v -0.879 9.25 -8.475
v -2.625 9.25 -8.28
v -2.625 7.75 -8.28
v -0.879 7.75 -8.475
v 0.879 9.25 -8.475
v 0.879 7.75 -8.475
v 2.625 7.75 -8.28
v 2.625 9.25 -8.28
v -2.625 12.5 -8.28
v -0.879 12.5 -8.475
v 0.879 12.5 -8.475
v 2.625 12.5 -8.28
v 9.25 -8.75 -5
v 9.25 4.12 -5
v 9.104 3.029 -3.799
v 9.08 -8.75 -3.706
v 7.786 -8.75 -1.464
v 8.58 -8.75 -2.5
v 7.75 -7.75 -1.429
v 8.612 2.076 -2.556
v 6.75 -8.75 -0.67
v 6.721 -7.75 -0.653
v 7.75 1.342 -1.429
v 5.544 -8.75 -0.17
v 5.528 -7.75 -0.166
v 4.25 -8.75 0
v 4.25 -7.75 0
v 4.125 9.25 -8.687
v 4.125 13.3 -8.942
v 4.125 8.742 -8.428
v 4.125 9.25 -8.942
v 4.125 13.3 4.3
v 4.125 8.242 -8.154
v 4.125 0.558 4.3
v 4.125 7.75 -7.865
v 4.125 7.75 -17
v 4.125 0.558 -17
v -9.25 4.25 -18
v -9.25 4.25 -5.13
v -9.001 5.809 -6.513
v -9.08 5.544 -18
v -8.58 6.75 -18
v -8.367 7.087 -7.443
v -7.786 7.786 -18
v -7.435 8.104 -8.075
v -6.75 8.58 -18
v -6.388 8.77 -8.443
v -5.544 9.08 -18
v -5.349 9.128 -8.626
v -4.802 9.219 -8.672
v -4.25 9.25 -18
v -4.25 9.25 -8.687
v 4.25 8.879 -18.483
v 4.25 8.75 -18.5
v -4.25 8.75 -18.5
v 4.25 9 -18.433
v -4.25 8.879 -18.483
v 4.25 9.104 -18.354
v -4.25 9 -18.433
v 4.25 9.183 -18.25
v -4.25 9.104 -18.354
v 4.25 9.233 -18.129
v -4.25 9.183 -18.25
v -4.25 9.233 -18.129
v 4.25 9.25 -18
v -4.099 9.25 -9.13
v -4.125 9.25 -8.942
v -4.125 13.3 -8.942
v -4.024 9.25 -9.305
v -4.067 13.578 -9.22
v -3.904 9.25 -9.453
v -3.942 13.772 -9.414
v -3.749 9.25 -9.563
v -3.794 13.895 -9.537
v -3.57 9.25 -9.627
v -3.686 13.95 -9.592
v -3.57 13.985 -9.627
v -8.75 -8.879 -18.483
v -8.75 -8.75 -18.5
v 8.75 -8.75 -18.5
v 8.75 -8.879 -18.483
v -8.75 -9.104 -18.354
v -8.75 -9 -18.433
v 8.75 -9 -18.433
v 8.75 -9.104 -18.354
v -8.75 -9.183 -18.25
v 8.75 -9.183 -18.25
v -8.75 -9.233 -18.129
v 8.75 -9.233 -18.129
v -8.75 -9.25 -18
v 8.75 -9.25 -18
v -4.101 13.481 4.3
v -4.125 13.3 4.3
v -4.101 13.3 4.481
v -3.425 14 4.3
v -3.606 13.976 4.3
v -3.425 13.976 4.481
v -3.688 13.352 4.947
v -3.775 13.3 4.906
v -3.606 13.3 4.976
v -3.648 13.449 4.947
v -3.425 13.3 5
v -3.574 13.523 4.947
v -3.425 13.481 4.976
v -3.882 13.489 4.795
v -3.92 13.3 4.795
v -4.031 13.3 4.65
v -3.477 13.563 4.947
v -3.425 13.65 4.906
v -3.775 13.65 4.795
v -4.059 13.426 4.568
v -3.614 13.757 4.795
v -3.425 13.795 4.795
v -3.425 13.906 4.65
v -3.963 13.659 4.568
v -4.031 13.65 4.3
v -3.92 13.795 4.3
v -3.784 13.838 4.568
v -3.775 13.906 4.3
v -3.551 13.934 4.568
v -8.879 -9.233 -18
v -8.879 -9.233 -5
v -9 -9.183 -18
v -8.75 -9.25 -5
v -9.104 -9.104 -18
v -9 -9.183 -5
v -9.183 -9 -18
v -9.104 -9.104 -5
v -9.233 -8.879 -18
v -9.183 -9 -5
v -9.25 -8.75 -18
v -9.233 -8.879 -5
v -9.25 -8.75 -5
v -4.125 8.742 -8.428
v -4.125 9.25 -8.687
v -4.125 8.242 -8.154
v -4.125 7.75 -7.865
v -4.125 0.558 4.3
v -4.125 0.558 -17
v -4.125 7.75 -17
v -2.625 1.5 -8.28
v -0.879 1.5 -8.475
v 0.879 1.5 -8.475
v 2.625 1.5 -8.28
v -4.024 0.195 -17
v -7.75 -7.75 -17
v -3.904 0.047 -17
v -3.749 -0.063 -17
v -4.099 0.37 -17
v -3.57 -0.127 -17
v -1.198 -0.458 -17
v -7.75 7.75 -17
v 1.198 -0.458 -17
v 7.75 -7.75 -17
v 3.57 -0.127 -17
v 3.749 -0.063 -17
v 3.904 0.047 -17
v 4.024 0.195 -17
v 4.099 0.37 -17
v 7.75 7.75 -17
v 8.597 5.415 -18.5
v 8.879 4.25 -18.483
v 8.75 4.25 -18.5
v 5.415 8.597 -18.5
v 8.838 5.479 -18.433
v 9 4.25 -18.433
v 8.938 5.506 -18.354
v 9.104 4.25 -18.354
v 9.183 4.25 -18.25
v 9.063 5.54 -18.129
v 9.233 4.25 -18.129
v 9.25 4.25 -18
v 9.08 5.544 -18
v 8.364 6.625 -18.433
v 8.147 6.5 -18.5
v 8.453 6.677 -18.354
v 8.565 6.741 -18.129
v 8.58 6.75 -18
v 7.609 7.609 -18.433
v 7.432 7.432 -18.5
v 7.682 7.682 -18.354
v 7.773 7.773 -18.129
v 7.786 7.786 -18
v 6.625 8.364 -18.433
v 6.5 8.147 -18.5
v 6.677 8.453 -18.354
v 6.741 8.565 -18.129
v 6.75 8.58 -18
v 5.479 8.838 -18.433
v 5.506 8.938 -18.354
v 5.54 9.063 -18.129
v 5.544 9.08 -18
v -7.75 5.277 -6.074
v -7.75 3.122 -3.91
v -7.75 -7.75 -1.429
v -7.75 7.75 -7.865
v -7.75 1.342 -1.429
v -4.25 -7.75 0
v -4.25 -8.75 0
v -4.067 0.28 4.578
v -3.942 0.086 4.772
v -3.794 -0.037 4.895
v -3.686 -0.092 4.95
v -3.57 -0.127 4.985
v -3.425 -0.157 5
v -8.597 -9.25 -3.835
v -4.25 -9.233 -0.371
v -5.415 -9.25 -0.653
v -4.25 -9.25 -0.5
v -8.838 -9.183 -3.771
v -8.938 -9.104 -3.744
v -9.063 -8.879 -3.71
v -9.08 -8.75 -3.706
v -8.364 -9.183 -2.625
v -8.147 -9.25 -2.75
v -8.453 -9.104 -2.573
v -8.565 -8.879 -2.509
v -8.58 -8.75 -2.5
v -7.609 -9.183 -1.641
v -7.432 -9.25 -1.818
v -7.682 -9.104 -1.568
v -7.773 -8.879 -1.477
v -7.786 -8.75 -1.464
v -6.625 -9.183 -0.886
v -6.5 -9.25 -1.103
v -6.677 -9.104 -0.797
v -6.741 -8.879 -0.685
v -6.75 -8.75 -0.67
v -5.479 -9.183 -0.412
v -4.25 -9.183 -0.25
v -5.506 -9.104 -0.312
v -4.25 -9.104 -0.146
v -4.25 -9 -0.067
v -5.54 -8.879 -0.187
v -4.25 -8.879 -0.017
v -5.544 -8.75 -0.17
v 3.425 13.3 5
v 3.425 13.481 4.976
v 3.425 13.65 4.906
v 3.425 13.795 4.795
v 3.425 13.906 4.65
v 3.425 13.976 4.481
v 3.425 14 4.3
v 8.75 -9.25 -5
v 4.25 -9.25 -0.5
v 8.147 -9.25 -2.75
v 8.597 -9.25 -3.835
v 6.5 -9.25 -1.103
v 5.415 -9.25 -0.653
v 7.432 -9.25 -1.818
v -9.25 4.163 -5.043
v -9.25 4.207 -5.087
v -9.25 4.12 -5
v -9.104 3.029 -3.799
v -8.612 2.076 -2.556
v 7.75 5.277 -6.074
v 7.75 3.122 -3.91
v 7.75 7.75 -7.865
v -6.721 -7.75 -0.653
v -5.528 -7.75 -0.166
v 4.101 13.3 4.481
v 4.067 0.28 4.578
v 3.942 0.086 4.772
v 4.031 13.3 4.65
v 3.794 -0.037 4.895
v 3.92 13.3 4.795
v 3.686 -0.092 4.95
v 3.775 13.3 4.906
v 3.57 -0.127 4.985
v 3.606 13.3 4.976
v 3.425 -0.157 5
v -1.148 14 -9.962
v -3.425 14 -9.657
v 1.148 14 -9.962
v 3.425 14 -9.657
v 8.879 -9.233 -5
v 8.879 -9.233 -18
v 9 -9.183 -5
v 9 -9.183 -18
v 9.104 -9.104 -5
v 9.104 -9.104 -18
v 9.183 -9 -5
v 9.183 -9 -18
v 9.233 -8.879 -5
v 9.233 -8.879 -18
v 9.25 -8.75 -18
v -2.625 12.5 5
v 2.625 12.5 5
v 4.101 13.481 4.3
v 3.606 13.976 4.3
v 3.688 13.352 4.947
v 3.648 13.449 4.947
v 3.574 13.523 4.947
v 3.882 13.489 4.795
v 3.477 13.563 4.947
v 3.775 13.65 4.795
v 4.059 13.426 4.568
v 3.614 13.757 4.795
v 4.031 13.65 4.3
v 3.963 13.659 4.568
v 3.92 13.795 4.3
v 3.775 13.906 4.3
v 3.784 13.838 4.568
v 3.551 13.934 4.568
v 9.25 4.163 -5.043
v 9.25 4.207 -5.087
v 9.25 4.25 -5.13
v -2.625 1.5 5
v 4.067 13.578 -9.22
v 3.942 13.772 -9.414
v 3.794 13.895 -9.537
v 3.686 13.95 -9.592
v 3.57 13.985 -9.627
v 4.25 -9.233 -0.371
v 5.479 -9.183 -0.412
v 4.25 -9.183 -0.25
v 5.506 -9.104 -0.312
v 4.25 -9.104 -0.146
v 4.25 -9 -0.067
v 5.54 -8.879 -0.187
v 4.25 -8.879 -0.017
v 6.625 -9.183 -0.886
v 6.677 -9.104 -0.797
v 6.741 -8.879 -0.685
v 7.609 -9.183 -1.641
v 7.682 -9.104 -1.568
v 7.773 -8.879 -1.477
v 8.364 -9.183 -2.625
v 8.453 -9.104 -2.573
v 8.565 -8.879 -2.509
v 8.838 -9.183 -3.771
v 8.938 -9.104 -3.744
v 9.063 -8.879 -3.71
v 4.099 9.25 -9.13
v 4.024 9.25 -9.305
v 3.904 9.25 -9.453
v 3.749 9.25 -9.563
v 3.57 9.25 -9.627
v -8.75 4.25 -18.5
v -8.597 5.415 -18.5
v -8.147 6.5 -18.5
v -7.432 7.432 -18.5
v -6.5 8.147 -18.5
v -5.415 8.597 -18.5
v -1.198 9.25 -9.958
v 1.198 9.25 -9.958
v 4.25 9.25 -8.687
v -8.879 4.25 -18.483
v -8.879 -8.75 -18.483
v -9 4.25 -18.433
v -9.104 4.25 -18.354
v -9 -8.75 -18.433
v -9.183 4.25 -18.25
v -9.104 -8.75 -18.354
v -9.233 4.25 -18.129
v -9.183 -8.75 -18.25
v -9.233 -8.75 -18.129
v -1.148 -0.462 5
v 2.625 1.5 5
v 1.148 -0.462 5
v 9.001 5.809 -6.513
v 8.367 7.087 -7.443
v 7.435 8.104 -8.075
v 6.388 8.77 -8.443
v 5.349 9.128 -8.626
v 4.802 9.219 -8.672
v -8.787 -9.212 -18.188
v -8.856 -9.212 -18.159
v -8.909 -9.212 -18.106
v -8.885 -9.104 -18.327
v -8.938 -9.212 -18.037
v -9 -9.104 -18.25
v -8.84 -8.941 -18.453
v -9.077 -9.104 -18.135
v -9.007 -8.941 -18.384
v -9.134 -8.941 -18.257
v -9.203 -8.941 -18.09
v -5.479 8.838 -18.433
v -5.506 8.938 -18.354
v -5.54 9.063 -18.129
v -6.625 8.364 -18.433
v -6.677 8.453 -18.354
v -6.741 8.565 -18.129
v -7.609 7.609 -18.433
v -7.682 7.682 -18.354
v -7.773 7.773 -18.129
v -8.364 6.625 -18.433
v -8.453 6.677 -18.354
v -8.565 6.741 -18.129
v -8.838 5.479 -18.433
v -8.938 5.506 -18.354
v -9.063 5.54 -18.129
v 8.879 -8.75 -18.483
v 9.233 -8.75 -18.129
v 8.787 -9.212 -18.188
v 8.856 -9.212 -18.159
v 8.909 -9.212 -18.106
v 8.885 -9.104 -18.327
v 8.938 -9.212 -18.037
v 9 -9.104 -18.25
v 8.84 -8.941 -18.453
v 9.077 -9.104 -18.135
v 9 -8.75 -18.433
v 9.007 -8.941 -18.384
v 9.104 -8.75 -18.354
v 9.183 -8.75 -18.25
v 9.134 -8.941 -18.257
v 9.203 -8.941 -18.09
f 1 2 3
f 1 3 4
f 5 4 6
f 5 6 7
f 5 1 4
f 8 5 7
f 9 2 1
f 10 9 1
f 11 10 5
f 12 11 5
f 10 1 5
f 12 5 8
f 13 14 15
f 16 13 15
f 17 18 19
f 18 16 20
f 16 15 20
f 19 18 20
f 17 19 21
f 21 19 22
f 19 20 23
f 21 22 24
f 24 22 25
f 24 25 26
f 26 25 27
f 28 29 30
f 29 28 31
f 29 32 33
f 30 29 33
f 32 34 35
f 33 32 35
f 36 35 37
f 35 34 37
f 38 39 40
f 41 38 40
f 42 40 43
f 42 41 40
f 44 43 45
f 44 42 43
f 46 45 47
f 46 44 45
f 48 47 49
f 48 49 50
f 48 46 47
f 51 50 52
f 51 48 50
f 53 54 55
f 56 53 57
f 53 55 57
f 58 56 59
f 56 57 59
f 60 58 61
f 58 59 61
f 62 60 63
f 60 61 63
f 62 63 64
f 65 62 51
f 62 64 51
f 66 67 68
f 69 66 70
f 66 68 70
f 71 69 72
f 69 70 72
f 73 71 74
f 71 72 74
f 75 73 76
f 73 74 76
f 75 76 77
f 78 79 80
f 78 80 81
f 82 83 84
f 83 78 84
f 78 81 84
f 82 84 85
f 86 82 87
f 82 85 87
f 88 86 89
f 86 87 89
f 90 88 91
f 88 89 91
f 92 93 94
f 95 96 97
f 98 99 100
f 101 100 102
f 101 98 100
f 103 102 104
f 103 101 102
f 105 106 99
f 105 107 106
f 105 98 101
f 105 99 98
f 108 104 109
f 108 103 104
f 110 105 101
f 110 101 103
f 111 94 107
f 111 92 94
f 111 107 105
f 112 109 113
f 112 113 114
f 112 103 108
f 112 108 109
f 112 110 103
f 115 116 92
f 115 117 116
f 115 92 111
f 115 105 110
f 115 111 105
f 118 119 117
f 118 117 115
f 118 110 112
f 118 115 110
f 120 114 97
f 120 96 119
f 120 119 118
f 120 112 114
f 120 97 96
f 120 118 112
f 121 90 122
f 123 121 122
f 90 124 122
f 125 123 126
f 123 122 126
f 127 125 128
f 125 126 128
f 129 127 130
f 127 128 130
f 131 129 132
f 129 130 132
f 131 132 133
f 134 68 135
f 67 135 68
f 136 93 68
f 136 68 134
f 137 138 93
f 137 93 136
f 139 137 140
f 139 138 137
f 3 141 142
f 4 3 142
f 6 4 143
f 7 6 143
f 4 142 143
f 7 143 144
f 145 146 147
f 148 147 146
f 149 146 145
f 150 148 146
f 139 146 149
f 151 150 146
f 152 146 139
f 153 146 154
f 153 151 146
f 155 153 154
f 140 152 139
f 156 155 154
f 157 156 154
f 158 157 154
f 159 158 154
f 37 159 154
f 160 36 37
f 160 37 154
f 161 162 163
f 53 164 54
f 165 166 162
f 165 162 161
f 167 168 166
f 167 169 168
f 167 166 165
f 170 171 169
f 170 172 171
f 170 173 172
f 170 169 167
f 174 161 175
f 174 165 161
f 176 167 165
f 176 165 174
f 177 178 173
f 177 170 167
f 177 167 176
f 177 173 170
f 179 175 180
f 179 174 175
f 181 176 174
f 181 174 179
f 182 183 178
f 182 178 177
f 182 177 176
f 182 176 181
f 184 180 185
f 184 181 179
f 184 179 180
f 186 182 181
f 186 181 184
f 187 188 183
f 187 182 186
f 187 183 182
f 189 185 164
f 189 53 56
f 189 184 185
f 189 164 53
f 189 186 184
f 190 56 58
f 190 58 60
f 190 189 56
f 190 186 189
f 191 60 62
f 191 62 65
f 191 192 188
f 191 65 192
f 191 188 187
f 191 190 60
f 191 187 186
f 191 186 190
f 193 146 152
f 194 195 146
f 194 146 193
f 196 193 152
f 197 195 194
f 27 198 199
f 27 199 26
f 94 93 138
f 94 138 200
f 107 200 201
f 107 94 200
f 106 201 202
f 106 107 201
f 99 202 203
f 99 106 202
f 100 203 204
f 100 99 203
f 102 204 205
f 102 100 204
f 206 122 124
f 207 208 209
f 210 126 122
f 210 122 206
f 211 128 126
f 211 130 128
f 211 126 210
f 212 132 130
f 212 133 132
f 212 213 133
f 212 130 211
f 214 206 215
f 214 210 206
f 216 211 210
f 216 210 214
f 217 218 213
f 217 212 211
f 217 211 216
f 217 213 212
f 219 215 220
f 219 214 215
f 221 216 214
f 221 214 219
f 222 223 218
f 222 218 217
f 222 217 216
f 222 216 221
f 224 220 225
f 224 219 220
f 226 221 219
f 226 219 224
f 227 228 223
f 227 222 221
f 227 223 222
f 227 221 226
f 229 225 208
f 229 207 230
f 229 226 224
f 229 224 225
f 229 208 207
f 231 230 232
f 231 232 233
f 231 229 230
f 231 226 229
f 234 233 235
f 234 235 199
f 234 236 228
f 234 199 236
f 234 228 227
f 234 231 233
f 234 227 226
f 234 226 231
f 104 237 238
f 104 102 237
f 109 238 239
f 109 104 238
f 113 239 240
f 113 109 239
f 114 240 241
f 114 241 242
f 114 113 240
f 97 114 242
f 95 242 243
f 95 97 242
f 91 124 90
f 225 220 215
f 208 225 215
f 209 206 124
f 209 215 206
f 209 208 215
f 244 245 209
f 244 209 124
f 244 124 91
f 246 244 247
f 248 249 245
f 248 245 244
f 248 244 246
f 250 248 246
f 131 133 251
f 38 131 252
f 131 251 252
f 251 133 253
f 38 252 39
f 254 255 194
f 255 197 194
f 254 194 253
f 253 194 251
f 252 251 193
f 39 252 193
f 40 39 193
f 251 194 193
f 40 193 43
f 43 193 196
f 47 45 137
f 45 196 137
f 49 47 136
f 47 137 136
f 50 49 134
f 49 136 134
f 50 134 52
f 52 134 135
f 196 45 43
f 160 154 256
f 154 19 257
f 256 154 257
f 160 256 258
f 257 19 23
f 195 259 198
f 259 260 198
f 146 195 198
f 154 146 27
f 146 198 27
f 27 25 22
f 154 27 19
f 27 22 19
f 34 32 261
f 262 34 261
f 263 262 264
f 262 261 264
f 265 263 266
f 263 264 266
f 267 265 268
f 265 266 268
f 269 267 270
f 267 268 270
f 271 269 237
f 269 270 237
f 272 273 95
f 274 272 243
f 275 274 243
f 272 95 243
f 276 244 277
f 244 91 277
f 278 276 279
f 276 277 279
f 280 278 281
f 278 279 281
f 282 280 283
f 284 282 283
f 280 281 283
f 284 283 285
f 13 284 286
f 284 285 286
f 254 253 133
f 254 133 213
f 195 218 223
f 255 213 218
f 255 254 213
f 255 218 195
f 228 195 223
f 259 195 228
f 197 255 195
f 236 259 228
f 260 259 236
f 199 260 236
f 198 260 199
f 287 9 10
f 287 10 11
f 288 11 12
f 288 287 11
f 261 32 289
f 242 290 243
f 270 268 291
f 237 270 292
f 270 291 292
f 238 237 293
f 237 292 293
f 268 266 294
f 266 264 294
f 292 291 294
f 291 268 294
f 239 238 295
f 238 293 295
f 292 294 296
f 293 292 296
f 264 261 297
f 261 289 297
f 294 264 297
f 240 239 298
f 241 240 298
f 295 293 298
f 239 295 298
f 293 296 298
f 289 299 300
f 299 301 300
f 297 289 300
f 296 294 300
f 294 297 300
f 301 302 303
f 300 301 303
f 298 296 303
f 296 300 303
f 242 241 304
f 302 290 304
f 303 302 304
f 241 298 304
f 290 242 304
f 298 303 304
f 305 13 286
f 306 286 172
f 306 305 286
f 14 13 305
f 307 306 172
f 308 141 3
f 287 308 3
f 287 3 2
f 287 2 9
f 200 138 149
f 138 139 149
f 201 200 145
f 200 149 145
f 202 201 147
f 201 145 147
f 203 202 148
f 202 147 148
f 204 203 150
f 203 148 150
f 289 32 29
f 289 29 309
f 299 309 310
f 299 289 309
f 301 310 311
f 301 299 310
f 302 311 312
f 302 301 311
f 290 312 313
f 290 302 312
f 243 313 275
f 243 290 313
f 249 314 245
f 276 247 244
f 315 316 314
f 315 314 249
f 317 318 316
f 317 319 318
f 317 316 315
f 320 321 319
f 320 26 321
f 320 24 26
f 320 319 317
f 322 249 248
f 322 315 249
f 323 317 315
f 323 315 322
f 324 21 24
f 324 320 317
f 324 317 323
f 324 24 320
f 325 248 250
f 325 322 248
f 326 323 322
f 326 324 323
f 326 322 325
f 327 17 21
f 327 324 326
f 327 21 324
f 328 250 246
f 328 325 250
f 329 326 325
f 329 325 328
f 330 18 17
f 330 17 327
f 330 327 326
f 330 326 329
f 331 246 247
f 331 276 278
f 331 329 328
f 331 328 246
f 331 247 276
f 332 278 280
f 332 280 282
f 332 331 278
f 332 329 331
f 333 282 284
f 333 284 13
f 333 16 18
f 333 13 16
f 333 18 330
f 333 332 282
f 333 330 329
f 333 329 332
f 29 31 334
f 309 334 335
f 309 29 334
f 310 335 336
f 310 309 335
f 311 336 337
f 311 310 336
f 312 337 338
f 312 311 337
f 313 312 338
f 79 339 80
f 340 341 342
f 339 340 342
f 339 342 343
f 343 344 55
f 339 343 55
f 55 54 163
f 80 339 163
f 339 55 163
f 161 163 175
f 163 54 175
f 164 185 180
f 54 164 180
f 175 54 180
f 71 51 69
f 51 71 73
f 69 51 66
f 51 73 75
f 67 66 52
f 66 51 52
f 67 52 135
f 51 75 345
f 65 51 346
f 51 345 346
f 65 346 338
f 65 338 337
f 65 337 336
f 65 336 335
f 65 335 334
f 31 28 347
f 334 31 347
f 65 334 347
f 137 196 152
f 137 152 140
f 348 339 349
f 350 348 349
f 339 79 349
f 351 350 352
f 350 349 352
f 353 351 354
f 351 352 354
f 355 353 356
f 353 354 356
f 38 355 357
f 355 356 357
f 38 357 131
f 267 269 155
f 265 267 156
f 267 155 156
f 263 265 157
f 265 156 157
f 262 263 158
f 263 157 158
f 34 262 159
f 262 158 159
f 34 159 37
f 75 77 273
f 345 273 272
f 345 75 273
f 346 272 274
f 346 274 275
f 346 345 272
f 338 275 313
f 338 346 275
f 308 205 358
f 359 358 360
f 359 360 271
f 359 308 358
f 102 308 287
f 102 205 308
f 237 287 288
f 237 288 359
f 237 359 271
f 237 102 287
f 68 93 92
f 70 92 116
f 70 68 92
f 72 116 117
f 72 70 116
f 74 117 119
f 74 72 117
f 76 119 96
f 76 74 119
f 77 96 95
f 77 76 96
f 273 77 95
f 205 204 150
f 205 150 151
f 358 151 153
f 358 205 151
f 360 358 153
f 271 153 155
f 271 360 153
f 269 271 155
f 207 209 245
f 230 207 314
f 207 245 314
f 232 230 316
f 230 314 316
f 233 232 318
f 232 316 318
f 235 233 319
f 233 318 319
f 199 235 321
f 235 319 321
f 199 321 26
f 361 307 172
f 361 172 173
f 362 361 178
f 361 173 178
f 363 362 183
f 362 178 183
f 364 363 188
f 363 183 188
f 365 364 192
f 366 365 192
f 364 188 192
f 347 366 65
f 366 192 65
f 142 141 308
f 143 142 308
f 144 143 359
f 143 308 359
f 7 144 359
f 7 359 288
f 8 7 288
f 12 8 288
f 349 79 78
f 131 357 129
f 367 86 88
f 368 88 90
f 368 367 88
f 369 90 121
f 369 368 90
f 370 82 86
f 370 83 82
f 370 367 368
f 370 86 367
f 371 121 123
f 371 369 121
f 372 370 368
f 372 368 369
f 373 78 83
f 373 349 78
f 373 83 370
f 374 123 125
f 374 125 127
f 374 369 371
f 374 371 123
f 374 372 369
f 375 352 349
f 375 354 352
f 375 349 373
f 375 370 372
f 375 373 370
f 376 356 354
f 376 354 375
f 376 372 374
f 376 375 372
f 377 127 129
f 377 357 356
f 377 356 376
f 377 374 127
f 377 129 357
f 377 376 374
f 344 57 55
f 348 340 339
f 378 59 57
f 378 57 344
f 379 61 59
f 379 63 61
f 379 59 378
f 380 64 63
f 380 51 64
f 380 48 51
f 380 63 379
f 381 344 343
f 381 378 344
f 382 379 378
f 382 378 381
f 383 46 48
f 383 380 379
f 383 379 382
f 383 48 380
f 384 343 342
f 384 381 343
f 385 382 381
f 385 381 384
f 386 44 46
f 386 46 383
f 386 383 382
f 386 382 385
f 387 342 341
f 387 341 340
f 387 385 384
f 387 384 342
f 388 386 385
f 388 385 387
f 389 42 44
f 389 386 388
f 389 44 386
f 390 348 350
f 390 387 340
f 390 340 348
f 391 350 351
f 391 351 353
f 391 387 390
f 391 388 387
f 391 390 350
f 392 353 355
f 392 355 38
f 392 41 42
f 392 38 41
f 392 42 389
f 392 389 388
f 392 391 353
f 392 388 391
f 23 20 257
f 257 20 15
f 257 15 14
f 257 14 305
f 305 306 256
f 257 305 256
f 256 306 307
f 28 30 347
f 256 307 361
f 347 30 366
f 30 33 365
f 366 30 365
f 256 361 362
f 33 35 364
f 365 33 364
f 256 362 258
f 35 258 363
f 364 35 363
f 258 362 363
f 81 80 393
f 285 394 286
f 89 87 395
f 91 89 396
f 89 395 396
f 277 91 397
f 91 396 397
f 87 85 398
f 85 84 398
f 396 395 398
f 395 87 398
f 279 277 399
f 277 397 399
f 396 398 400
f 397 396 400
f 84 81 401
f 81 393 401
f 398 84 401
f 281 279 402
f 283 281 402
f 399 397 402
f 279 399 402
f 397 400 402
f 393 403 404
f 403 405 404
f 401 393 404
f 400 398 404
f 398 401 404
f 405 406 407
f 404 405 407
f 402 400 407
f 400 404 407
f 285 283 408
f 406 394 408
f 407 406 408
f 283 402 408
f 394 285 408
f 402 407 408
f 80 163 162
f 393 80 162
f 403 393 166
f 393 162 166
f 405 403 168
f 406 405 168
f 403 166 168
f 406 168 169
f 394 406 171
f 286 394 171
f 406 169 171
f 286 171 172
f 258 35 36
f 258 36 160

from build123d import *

# Parameters (mm, degrees)
F0_W         = 18.5
F0_H         = 18.5
F1_DEPTH     = 18.5
F2_R         = 19
F3_DEPTH     = 25.4
F4_T         = -1.5
F6_DEPTH     = 14
F7_T         = 1.5
F7_T3_DEPTH  = 3.8130317325
F7_T5_DEPTH  = 20
F7_T7_DEPTH  = 18.5
F7_T9_DEPTH  = 12.1348502244
F7_T11_DEPTH = 18.5
F7_T13_DEPTH = 4.6348502244
F7_T16_ANGLE = 5.1594967302
F7_T18_ANGLE = 27.6449084771
F7_T20_ANGLE = 5.1594967302
F7_T22_ANGLE = 27.6449084771
F9_DEPTH     = 23.32034
F10_DEPTH    = 8.55107
F11_R        = 5
F12_R        = 0.7
F13_R        = 0.5


# Not quite as in the source:
# - a shell that OpenCascade refuses in one call is made with other operations: the cavity is built on its own and cut out


with BuildPart() as f1:
    # F0 (on Top) → F1 (new body)
    with BuildSketch(Plane.XY):
        Rectangle(F0_W, F0_H)
    extrude(amount=-F1_DEPTH)

    # F2 (on face) → F3 (cut)
    with BuildSketch(Plane.YZ.offset(9.25)):
        with Locations((17.6200576851, 8.3700576851)):
            Circle(F2_R)
    extrude(amount=-F3_DEPTH, mode=Mode.SUBTRACT)

    # F4
    f4_openings = [f1.faces().sort_by_distance(p)[0] for p in [
        (0, -4.343484, 0),
        (0, 4.185029, -5.064971),
    ]]
    offset(amount=F4_T, openings=f4_openings)

    # F5 (on Front) → F6 (join)
    with BuildSketch(Plane.XZ):
        with BuildLine():
            Line((4.125, -9.5), (4.125, 5))
            Line((4.125, 5), (0, 5))
            Line((0, 5), (-4.125, 5))
            Line((-4.125, 5), (-4.125, -9.5))
            ThreePointArc((-4.125, -9.5), (0, -10), (4.125, -9.5))
        make_face()
    extrude(amount=-F6_DEPTH)

    # F7: shell of thickness 1.5, made by hand


with BuildPart() as f7_core1:
    # F7_t2: copy of F1
    add(f1.part)

    # the walls: a layer under each face that stays
    f7_faces = [f7_core1.faces().sort_by_distance(p)[0] for p in [
        (9.25, 0, -9.25),
        (-7.9285714286, -8.549069162, 0),
        (8.3958333333, 1.5822898542, -1.8176801895),
        (0, 9.25, -13.5934841338),
        (0, 0, -18.5),
        (0, -9.25, -9.25),
        (-8.3958333333, 1.5822898542, -1.8176801895),
        (-9.25, 0, -9.25),
        (7.75, 0, -8.5),
        (0, -7.75, -8.5),
        (-7.75, 0, -8.5),
        (4.125, 7, -2.25),
        (0, 7.75, -12.4325748878),
        (0, 11.625, -10),
        (-4.125, 7, -2.25),
        (0, 0, -17),
        (0, 0, -2.5),
        (0, 14, -2.5),
        (0, 3.875, -10),
    ]]
    thicken(f7_faces, amount=-F7_T, mode=Mode.SUBTRACT)

    # F7_s4 → F7_t3 (cut)
    with BuildSketch(Plane.XY.offset(-11)):
        Polygon((4.14, 9.265), (4.125, 7.75), (2.625, 7.75), (2.625, 9.25), align=None)
        Polygon((-4.14, 9.265), (-4.125, 7.75), (-2.625, 7.75), (-2.625, 9.25), align=None)
    extrude(amount=F7_T3_DEPTH, mode=Mode.SUBTRACT)

    # F7_s6 → F7_t5 (cut)
    with BuildSketch(Plane.XY.offset(-18.5)):
        Polygon((7.735, -7.735), (9.25, -7.75), (9.25, -9.25), (7.75, -9.25), align=None)
        Polygon((-7.735, -7.735), (-7.75, -9.25), (-9.25, -9.25), (-9.25, -7.75), align=None)
    extrude(amount=F7_T5_DEPTH, mode=Mode.SUBTRACT)

    # F7_s8 → F7_t7 (cut)
    with BuildSketch(Plane.XZ.offset(-9.25)):
        Polygon((7.735, -16.985), (9.25, -17), (9.25, -18.5), (7.75, -18.5), align=None)
        Polygon((-7.735, -16.985), (-9.25, -17), (-9.25, -18.5), (-7.75, -18.5), align=None)
    extrude(amount=F7_T7_DEPTH, mode=Mode.SUBTRACT)

    # F7_s10 → F7_t9 (cut)
    with BuildSketch(Plane.XY.offset(-18.5)):
        Polygon((7.735, 7.735), (9.25, 7.75), (9.25, 9.25), (7.75, 9.25), align=None)
        Polygon((-7.735, 7.735), (-9.25, 7.75), (-9.25, 9.25), (-7.75, 9.25), align=None)
    extrude(amount=F7_T9_DEPTH, mode=Mode.SUBTRACT)

    # F7_s12 → F7_t11 (cut)
    with BuildSketch(Plane.YZ.offset(-9.25)):
        Polygon((-7.735, -16.985), (-9.25, -17), (-9.25, -18.5), (-7.75, -18.5), align=None)
        Polygon((7.735, -16.985), (9.25, -17), (9.25, -18.5), (7.75, -18.5), align=None)
    extrude(amount=F7_T11_DEPTH, mode=Mode.SUBTRACT)

    # F7_s14 → F7_t13 (cut)
    with BuildSketch(Plane.XY.offset(-11)):
        Polygon((4.14, 7.735), (2.625, 7.75), (2.625, 9.25), (4.125, 9.25), align=None)
        Polygon((-4.14, 7.735), (-4.125, 9.25), (-2.625, 9.25), (-2.625, 7.75), align=None)
    extrude(amount=F7_T13_DEPTH, mode=Mode.SUBTRACT)

    # F7_s15 → F7_t16 (revolve, cut)
    with BuildSketch(Plane(origin=(0, 9.1498364132, -5.5625660113), x_dir=(1, 0, 0), z_dir=(0, -0.8544846032, 0.5194767203))):
        Polygon((4.14, -2.679704803), (4.125, -4.194704803), (2.625, -4.194704803), (2.625, -2.694704803), align=None)
    revolve(axis=Axis((4.125, 17.6200576851, 8.3700576851), (1, 0, 0)), revolution_arc=F7_T16_ANGLE, mode=Mode.SUBTRACT)

    # F7_s17 → F7_t18 (revolve, cut)
    with BuildSketch(Plane(origin=(-1.6855904875, 0, 0.4147212383), x_dir=(0, 1, 0), z_dir=(-0.971040724, 0, 0.2389140271))):
        Polygon((9.265, 10.2254072398), (7.75, 10.2104072398), (7.75, 8.7104072398), (9.25, 8.7104072398), align=None)
    revolve(axis=Axis((0, 9.25, 7.265625), (0, -1, 0)), revolution_arc=F7_T18_ANGLE, mode=Mode.SUBTRACT)

    # F7_s19 → F7_t20 (revolve, cut)
    with BuildSketch(Plane(origin=(0, 9.1498364132, -5.5625660113), x_dir=(1, 0, 0), z_dir=(0, -0.8544846032, 0.5194767203))):
        Polygon((-4.14, -2.679704803), (-4.125, -4.194704803), (-2.625, -4.194704803), (-2.625, -2.694704803), align=None)
    revolve(axis=Axis((-4.125, 17.6200576851, 8.3700576851), (1, 0, 0)), revolution_arc=F7_T20_ANGLE, mode=Mode.SUBTRACT)

    # F7_s21 → F7_t22 (revolve, cut)
    with BuildSketch(Plane(origin=(-1.6855904875, 0, 0.4147212383), x_dir=(0, 1, 0), z_dir=(-0.971040724, 0, 0.2389140271))):
        Polygon((7.735, 10.2254072398), (9.25, 10.2104072398), (9.25, 8.7104072398), (7.75, 8.7104072398), align=None)
    revolve(axis=Axis((0, 7.75, 7.265625), (0, -1, 0)), revolution_arc=F7_T22_ANGLE, mode=Mode.SUBTRACT)


with BuildPart() as f1_1:
    add(f1.part)

    # what is left inside the walls is the cavity
    f7_cavity = [f7_core1.part.solids().sort_by_distance(p)[0] for p in [
        (-2.61, 7, 0.573356),
    ]]
    add(f7_cavity, mode=Mode.SUBTRACT)

    # F8 (on face) → F9 (join)
    with BuildSketch(Plane.XY.offset(5)):
        with BuildLine():
            Line((4.125, 0), (-4.125, 0))
            ThreePointArc((-4.125, 0), (0, -0.5), (4.125, 0))
        make_face()
    extrude(amount=-F9_DEPTH)

    # F10 (add): a face of the model
    f10_faces = [f1_1.faces().sort_by_distance(p)[0] for p in [
        (0, 0, -13.4156113664),
    ]]
    extrude(f10_faces, amount=F10_DEPTH)

    # F11
    f11_edges = [f1_1.edges().sort_by_distance(p)[0] for p in [
        (-9.25, -4.343484, 0),
        (9.25, -4.343484, 0),
        (9.25, 9.25, -13.593484),
        (-9.25, 9.25, -13.593484),
    ]]
    fillet(f11_edges, radius=F11_R)

    # F12
    f12_edges = [f1_1.edges().sort_by_distance(p)[0] for p in [
        (4.125, 14, -2.25),
        (-4.125, 14, -2.25),
        (4.125, 7, 5),
        (-4.125, 7, 5),
        (-4.125, 11.625, -9.5),
        (4.125, 11.625, -9.5),
        (4.125, 0, -6),
        (-4.125, 0, -6),
        (0, 14, 5),
    ]]
    fillet(f12_edges, radius=F12_R)

    # F13
    f13_edges = [f1_1.edges().sort_by_distance(p)[0] for p in [
        (9.25, -2.5, -18.5),
        (0, -9.25, -18.5),
        (9.25, -9.25, -11.75),
        (-9.25, -2.5, -18.5),
        (-9.25, -9.25, -11.75),
        (0, 9.25, -18.5),
        (7.785534, 7.785534, -18.5),
        (-7.785534, 7.785534, -18.5),
        (7.785534, -9.25, -1.464466),
        (-7.785534, -9.25, -1.464466),
        (0, -9.25, 0),
    ]]
    fillet(f13_edges, radius=F13_R)


solid = f1_1.part
